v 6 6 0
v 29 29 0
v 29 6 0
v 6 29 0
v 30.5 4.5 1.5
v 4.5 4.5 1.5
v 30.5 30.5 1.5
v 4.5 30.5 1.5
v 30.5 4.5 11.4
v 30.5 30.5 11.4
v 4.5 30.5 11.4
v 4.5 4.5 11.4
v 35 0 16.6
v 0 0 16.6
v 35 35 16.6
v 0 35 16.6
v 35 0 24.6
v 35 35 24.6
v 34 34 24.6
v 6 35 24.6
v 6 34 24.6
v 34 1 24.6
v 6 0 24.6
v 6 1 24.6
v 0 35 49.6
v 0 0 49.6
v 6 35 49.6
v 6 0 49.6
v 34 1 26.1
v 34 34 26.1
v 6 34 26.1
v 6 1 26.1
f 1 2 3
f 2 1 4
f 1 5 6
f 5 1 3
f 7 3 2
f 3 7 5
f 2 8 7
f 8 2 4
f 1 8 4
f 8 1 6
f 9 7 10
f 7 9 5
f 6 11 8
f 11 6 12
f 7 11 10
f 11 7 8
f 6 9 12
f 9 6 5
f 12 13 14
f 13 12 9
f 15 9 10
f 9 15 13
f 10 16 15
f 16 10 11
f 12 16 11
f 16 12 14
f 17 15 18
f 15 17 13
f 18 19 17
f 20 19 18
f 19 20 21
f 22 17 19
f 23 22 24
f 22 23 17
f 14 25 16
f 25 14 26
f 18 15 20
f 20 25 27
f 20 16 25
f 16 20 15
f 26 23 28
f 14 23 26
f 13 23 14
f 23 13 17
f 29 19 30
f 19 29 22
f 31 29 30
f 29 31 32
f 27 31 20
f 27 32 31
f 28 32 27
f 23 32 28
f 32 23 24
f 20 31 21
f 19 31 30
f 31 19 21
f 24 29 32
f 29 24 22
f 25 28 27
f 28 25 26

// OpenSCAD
//
// DungeonBlocks floor + one-wall tile
// Clean parametric reconstruction
//

// ---------- Tile footprint ----------
tile_size = 35.0;


// ---------- Socket (underside peg) ----------
socket_height       = 16.6;  // total socket height = tile base z
socket_mid_size     = 26.0;  // column cross-section
socket_flare_height = 5.2;   // structural top flare, always sharp-cornered

corner_size      = 1.5;      // bevel depth or fillet radius on column corners; 0 = none
corner_round     = false;    // false = chamfer bevel, true = curved fillet
socket_corner_fn = 16;       // $fn for fillet cylinders/spheres

logo_S           = 1.5;      // size unit; logo width = 10*logo_S
logo_stroke      = 0.4;      // stroke width in mm (independent of size)
logo_fn          = 64;       // $fn for logo circles/arcs
logo_circle_r    = 0.8;      // central circle radius multiplier (× logo_S)
logo_petal_r     = 4.0;      // petal arc radius in mm (smaller = more curved)
logo_squash      = 0.65;     // vertical squash of top face (0.5 = isometric)
logo_box_depth   = 3.0;      // side-wall drop in mm


// ---------- Terrain block (floor slab) ----------
tile_bulk_height   = 8.0;
tile_detail_height = 1.5;

floor_detail_x0 = 6.0;
floor_detail_x1 = 34.0;
floor_detail_y0 = 1.0;
floor_detail_y1 = 34.0;


// ---------- Wall ----------
wall_height    = 33.0;
wall_thickness = 6.0;


// ---------- Derived Z positions (not parameters) ----------
socket_top_z = socket_height - socket_flare_height;
tile_base_z  = socket_height;

tile_bulk_top_z   = tile_base_z    + tile_bulk_height;
tile_detail_top_z = tile_bulk_top_z + tile_detail_height;

wall_bottom_z = tile_base_z;
wall_top_z    = wall_bottom_z + wall_height;

wall_x0 = 0.0;
wall_x1 = wall_thickness;
wall_y0 = 0.0;
wall_y1 = tile_size;


// ---------- Helpers ----------

module _socket_corner_discs(size_xy, z, r) {
    inset = (tile_size - size_xy) / 2;
    rr    = min(r, size_xy / 2 - 0.01);
    for (x = [inset + rr, inset + size_xy - rr])
    for (y = [inset + rr, inset + size_xy - rr])
        translate([x, y, z])
            cylinder(r=rr, h=0.001, $fn=socket_corner_fn);
}

module centered_square_prism(size_xy, z0, height, r=0, round_bottom=false) {
    inset = (tile_size - size_xy) / 2;
    if (r <= 0) {
        translate([inset, inset, z0])
            cube([size_xy, size_xy, height], center=false);
    } else {
        rr = min(r, size_xy / 2 - 0.01);
        if (round_bottom) {
            hull() {
                for (x = [inset + rr, inset + size_xy - rr])
                for (y = [inset + rr, inset + size_xy - rr])
                    translate([x, y, z0 + rr])
                        sphere(r=rr, $fn=socket_corner_fn);
                translate([inset, inset, z0 + height])
                    cube([size_xy, size_xy, 0.001]);
            }
        } else {
            hull() {
                for (x = [inset + rr, inset + size_xy - rr])
                for (y = [inset + rr, inset + size_xy - rr])
                    translate([x, y, z0])
                        cylinder(r=rr, h=0.001, $fn=socket_corner_fn);
                translate([inset, inset, z0 + height])
                    cube([size_xy, size_xy, 0.001]);
            }
        }
    }
}

module square_frustum(bottom_size, top_size, z0, height, r=0) {
    if (r <= 0) {
        bottom_inset = (tile_size - bottom_size) / 2;
        top_inset    = (tile_size - top_size) / 2;
        polyhedron(
            points = [
                [bottom_inset,             bottom_inset,             z0],
                [tile_size - bottom_inset, bottom_inset,             z0],
                [tile_size - bottom_inset, tile_size - bottom_inset, z0],
                [bottom_inset,             tile_size - bottom_inset, z0],
                [top_inset,                top_inset,                z0 + height],
                [tile_size - top_inset,    top_inset,                z0 + height],
                [tile_size - top_inset,    tile_size - top_inset,    z0 + height],
                [top_inset,                tile_size - top_inset,    z0 + height]
            ],
            faces = [
                [0, 3, 2, 1],
                [4, 5, 6, 7],
                [0, 1, 5, 4],
                [1, 2, 6, 5],
                [2, 3, 7, 6],
                [3, 0, 4, 7]
            ]
        );
    } else {
        hull() {
            _socket_corner_discs(bottom_size, z0,          r);
            _socket_corner_discs(top_size,    z0 + height, r);
        }
    }
}


// ---------- Logo ----------

// Arc center on the inward (origin-side) perpendicular bisector of chord p1→p2
// at radius r. The resulting arc bows outward away from the origin.
function _petal_arc_center(p1, p2, r) =
    let(mx = (p1[0]+p2[0])/2,  my = (p1[1]+p2[1])/2,
        dx =  p2[0]-p1[0],     dy =  p2[1]-p1[1],
        d  = sqrt(dx*dx + dy*dy),
        h  = sqrt(max(0, r*r - d*d/4)),
        nx = -dy/d,            ny =  dx/d,
        s  = (nx*mx + ny*my > 0) ? -1 : 1)
    [mx + s*h*nx,  my + s*h*ny];

// Signed angular span a1→a2 via the short arc, result in (-180, 180].
function _short_span(a1, a2) =
    let(raw = a2 - a1,
        n   = raw - 360*floor(raw/360))
    (n > 180) ? n - 360 : n;

// Filled stroked-arc polygon: center c, radius r, start a1, angular span da.
module _arc_stroke_2d(c, r, a1, da, st) {
    ro = r + st/2;
    ri = r - st/2;
    polygon(concat(
        [for (i=[0:logo_fn]) let(a=a1+i*da/logo_fn) [c[0]+ro*cos(a), c[1]+ro*sin(a)]],
        [for (i=[logo_fn:-1:0]) let(a=a1+i*da/logo_fn) [c[0]+ri*cos(a), c[1]+ri*sin(a)]]
    ));
}

// Stroked arc from p1 to p2 bowing outward from the origin.
module _petal_arc_stroke(p1, p2, rp, st) {
    c  = _petal_arc_center(p1, p2, rp);
    a1 = atan2(p1[1]-c[1], p1[0]-c[0]);
    a2 = atan2(p2[1]-c[1], p2[0]-c[0]);
    _arc_stroke_2d(c, rp, a1, _short_span(a1, a2), st);
}

// Rotate point p by rot degrees then squash y by sq.
function _sq_rot(p, rot, sq) =
    let(c = cos(rot),  s = sin(rot),
        rx = c*p[0] - s*p[1],
        ry = s*p[0] + c*p[1])
    [rx, ry*sq];

// Stroked straight line between two 2D points.
module _logo_line_stroke(p1, p2, st) {
    dx = p2[0]-p1[0];  dy = p2[1]-p1[1];
    translate([(p1[0]+p2[0])/2, (p1[1]+p2[1])/2])
        rotate([0, 0, atan2(dy, dx)])
        square([sqrt(dx*dx+dy*dy), st], center=true);
}

module dharma_logo_2d(S, st) {
    tw      = 10 * S;
    half    = tw / 2;
    rc      = logo_circle_r * S;
    rp      = logo_petal_r;
    sq      = logo_squash;
    dep     = logo_box_depth;
    ps      = rc + (half - rc) / 6;
    pt      = (half - st) / 2;
    hs      = half * sq;   // squashed half-height (y of front/back diamond corners)
    sq_poly = [[0, hs], [half, 0], [0, -hs], [-half, 0]];

    // Rotate so the box "vertical" runs along the tile X axis, then centre.
    rotate([0, 0, -90])
    translate([0, dep/2]) {
        // Diamond outline — offset on squashed polygon gives constant-width stroke
        difference() {
            polygon(sq_poly);
            offset(delta=-st) polygon(sq_poly);
        }

        // Cross arms in squashed coordinates, constant stroke width:
        //   horizontal bar unchanged; vertical bar height = tw*sq; ellipse cutout
        intersection() {
            polygon(sq_poly);
            difference() {
                union() {
                    square([st,  tw*sq], center=true);  // vertical arm, squashed
                    square([tw,  st   ], center=true);  // horizontal arm
                }
                scale([1, sq]) circle(r=rc-st/2, $fn=logo_fn);  // ellipse cutout
            }
        }

        // Central circle → ellipse; offset() gives constant-width stroke around it
        difference() {
            offset(delta=+st/2) scale([1, sq]) circle(r=rc, $fn=logo_fn);
            offset(delta=-st/2) scale([1, sq]) circle(r=rc, $fn=logo_fn);
        }

        // Petals: rotate then squash each endpoint so arcs live in squashed space
        intersection() {
            polygon(sq_poly);
            for (rot = [0:90:270]) {
                p1 = _sq_rot([0,  ps], rot, sq);
                p2 = _sq_rot([ps,  0], rot, sq);
                pm = _sq_rot([pt, pt], rot, sq);
                _petal_arc_stroke(p1, pm, rp, st);
                _petal_arc_stroke(p2, pm, rp, st);
            }
        }

        // Box side walls: 3 vertical edges + 2 bottom connecting edges
        _logo_line_stroke([-half,   0],  [-half,  -dep],    st);
        _logo_line_stroke([ half,   0],  [ half,  -dep],    st);
        _logo_line_stroke([    0, -hs],  [    0, -hs-dep],  st);
        _logo_line_stroke([-half, -dep], [    0, -hs-dep],  st);
        _logo_line_stroke([    0, -hs-dep], [half, -dep],   st);
    }
}


// ---------- Components ----------
module socket_base() {
    r           = corner_round ? corner_size : 0;
    bevel_entry = !corner_round && corner_size > 0;
    col_z0      = bevel_entry ? corner_size : 0;
    col_height  = socket_top_z - col_z0;

    difference() {
        union() {
            // Bottom entry: linear chamfer or spherical-cap roundover
            if (bevel_entry)
                square_frustum(
                    socket_mid_size - 2 * corner_size,
                    socket_mid_size,
                    0,
                    corner_size
                );

            centered_square_prism(
                socket_mid_size, col_z0, col_height,
                r, corner_round
            );

            square_frustum(socket_mid_size, tile_size, socket_top_z, socket_flare_height);
        }

        // Logo inset 0.4 mm into the bottom face
        translate([tile_size/2, tile_size/2, -0.01])
            linear_extrude(height=0.41)
                dharma_logo_2d(logo_S, logo_stroke);
    }
}

module floor_tile() {
    union() {
        translate([0, 0, tile_base_z])
            cube([tile_size, tile_size, tile_bulk_height], center=false);

        translate([floor_detail_x0, floor_detail_y0, tile_bulk_top_z])
            cube([
                floor_detail_x1 - floor_detail_x0,
                floor_detail_y1 - floor_detail_y0,
                tile_detail_height
            ], center=false);
    }
}

module one_wall() {
    translate([wall_x0, wall_y0, wall_bottom_z])
        cube([
            wall_x1 - wall_x0,
            wall_y1 - wall_y0,
            wall_top_z - wall_bottom_z
        ], center=false);
}


// ---------- Final model ----------
union() {
    socket_base();
    floor_tile();
    one_wall();
}
